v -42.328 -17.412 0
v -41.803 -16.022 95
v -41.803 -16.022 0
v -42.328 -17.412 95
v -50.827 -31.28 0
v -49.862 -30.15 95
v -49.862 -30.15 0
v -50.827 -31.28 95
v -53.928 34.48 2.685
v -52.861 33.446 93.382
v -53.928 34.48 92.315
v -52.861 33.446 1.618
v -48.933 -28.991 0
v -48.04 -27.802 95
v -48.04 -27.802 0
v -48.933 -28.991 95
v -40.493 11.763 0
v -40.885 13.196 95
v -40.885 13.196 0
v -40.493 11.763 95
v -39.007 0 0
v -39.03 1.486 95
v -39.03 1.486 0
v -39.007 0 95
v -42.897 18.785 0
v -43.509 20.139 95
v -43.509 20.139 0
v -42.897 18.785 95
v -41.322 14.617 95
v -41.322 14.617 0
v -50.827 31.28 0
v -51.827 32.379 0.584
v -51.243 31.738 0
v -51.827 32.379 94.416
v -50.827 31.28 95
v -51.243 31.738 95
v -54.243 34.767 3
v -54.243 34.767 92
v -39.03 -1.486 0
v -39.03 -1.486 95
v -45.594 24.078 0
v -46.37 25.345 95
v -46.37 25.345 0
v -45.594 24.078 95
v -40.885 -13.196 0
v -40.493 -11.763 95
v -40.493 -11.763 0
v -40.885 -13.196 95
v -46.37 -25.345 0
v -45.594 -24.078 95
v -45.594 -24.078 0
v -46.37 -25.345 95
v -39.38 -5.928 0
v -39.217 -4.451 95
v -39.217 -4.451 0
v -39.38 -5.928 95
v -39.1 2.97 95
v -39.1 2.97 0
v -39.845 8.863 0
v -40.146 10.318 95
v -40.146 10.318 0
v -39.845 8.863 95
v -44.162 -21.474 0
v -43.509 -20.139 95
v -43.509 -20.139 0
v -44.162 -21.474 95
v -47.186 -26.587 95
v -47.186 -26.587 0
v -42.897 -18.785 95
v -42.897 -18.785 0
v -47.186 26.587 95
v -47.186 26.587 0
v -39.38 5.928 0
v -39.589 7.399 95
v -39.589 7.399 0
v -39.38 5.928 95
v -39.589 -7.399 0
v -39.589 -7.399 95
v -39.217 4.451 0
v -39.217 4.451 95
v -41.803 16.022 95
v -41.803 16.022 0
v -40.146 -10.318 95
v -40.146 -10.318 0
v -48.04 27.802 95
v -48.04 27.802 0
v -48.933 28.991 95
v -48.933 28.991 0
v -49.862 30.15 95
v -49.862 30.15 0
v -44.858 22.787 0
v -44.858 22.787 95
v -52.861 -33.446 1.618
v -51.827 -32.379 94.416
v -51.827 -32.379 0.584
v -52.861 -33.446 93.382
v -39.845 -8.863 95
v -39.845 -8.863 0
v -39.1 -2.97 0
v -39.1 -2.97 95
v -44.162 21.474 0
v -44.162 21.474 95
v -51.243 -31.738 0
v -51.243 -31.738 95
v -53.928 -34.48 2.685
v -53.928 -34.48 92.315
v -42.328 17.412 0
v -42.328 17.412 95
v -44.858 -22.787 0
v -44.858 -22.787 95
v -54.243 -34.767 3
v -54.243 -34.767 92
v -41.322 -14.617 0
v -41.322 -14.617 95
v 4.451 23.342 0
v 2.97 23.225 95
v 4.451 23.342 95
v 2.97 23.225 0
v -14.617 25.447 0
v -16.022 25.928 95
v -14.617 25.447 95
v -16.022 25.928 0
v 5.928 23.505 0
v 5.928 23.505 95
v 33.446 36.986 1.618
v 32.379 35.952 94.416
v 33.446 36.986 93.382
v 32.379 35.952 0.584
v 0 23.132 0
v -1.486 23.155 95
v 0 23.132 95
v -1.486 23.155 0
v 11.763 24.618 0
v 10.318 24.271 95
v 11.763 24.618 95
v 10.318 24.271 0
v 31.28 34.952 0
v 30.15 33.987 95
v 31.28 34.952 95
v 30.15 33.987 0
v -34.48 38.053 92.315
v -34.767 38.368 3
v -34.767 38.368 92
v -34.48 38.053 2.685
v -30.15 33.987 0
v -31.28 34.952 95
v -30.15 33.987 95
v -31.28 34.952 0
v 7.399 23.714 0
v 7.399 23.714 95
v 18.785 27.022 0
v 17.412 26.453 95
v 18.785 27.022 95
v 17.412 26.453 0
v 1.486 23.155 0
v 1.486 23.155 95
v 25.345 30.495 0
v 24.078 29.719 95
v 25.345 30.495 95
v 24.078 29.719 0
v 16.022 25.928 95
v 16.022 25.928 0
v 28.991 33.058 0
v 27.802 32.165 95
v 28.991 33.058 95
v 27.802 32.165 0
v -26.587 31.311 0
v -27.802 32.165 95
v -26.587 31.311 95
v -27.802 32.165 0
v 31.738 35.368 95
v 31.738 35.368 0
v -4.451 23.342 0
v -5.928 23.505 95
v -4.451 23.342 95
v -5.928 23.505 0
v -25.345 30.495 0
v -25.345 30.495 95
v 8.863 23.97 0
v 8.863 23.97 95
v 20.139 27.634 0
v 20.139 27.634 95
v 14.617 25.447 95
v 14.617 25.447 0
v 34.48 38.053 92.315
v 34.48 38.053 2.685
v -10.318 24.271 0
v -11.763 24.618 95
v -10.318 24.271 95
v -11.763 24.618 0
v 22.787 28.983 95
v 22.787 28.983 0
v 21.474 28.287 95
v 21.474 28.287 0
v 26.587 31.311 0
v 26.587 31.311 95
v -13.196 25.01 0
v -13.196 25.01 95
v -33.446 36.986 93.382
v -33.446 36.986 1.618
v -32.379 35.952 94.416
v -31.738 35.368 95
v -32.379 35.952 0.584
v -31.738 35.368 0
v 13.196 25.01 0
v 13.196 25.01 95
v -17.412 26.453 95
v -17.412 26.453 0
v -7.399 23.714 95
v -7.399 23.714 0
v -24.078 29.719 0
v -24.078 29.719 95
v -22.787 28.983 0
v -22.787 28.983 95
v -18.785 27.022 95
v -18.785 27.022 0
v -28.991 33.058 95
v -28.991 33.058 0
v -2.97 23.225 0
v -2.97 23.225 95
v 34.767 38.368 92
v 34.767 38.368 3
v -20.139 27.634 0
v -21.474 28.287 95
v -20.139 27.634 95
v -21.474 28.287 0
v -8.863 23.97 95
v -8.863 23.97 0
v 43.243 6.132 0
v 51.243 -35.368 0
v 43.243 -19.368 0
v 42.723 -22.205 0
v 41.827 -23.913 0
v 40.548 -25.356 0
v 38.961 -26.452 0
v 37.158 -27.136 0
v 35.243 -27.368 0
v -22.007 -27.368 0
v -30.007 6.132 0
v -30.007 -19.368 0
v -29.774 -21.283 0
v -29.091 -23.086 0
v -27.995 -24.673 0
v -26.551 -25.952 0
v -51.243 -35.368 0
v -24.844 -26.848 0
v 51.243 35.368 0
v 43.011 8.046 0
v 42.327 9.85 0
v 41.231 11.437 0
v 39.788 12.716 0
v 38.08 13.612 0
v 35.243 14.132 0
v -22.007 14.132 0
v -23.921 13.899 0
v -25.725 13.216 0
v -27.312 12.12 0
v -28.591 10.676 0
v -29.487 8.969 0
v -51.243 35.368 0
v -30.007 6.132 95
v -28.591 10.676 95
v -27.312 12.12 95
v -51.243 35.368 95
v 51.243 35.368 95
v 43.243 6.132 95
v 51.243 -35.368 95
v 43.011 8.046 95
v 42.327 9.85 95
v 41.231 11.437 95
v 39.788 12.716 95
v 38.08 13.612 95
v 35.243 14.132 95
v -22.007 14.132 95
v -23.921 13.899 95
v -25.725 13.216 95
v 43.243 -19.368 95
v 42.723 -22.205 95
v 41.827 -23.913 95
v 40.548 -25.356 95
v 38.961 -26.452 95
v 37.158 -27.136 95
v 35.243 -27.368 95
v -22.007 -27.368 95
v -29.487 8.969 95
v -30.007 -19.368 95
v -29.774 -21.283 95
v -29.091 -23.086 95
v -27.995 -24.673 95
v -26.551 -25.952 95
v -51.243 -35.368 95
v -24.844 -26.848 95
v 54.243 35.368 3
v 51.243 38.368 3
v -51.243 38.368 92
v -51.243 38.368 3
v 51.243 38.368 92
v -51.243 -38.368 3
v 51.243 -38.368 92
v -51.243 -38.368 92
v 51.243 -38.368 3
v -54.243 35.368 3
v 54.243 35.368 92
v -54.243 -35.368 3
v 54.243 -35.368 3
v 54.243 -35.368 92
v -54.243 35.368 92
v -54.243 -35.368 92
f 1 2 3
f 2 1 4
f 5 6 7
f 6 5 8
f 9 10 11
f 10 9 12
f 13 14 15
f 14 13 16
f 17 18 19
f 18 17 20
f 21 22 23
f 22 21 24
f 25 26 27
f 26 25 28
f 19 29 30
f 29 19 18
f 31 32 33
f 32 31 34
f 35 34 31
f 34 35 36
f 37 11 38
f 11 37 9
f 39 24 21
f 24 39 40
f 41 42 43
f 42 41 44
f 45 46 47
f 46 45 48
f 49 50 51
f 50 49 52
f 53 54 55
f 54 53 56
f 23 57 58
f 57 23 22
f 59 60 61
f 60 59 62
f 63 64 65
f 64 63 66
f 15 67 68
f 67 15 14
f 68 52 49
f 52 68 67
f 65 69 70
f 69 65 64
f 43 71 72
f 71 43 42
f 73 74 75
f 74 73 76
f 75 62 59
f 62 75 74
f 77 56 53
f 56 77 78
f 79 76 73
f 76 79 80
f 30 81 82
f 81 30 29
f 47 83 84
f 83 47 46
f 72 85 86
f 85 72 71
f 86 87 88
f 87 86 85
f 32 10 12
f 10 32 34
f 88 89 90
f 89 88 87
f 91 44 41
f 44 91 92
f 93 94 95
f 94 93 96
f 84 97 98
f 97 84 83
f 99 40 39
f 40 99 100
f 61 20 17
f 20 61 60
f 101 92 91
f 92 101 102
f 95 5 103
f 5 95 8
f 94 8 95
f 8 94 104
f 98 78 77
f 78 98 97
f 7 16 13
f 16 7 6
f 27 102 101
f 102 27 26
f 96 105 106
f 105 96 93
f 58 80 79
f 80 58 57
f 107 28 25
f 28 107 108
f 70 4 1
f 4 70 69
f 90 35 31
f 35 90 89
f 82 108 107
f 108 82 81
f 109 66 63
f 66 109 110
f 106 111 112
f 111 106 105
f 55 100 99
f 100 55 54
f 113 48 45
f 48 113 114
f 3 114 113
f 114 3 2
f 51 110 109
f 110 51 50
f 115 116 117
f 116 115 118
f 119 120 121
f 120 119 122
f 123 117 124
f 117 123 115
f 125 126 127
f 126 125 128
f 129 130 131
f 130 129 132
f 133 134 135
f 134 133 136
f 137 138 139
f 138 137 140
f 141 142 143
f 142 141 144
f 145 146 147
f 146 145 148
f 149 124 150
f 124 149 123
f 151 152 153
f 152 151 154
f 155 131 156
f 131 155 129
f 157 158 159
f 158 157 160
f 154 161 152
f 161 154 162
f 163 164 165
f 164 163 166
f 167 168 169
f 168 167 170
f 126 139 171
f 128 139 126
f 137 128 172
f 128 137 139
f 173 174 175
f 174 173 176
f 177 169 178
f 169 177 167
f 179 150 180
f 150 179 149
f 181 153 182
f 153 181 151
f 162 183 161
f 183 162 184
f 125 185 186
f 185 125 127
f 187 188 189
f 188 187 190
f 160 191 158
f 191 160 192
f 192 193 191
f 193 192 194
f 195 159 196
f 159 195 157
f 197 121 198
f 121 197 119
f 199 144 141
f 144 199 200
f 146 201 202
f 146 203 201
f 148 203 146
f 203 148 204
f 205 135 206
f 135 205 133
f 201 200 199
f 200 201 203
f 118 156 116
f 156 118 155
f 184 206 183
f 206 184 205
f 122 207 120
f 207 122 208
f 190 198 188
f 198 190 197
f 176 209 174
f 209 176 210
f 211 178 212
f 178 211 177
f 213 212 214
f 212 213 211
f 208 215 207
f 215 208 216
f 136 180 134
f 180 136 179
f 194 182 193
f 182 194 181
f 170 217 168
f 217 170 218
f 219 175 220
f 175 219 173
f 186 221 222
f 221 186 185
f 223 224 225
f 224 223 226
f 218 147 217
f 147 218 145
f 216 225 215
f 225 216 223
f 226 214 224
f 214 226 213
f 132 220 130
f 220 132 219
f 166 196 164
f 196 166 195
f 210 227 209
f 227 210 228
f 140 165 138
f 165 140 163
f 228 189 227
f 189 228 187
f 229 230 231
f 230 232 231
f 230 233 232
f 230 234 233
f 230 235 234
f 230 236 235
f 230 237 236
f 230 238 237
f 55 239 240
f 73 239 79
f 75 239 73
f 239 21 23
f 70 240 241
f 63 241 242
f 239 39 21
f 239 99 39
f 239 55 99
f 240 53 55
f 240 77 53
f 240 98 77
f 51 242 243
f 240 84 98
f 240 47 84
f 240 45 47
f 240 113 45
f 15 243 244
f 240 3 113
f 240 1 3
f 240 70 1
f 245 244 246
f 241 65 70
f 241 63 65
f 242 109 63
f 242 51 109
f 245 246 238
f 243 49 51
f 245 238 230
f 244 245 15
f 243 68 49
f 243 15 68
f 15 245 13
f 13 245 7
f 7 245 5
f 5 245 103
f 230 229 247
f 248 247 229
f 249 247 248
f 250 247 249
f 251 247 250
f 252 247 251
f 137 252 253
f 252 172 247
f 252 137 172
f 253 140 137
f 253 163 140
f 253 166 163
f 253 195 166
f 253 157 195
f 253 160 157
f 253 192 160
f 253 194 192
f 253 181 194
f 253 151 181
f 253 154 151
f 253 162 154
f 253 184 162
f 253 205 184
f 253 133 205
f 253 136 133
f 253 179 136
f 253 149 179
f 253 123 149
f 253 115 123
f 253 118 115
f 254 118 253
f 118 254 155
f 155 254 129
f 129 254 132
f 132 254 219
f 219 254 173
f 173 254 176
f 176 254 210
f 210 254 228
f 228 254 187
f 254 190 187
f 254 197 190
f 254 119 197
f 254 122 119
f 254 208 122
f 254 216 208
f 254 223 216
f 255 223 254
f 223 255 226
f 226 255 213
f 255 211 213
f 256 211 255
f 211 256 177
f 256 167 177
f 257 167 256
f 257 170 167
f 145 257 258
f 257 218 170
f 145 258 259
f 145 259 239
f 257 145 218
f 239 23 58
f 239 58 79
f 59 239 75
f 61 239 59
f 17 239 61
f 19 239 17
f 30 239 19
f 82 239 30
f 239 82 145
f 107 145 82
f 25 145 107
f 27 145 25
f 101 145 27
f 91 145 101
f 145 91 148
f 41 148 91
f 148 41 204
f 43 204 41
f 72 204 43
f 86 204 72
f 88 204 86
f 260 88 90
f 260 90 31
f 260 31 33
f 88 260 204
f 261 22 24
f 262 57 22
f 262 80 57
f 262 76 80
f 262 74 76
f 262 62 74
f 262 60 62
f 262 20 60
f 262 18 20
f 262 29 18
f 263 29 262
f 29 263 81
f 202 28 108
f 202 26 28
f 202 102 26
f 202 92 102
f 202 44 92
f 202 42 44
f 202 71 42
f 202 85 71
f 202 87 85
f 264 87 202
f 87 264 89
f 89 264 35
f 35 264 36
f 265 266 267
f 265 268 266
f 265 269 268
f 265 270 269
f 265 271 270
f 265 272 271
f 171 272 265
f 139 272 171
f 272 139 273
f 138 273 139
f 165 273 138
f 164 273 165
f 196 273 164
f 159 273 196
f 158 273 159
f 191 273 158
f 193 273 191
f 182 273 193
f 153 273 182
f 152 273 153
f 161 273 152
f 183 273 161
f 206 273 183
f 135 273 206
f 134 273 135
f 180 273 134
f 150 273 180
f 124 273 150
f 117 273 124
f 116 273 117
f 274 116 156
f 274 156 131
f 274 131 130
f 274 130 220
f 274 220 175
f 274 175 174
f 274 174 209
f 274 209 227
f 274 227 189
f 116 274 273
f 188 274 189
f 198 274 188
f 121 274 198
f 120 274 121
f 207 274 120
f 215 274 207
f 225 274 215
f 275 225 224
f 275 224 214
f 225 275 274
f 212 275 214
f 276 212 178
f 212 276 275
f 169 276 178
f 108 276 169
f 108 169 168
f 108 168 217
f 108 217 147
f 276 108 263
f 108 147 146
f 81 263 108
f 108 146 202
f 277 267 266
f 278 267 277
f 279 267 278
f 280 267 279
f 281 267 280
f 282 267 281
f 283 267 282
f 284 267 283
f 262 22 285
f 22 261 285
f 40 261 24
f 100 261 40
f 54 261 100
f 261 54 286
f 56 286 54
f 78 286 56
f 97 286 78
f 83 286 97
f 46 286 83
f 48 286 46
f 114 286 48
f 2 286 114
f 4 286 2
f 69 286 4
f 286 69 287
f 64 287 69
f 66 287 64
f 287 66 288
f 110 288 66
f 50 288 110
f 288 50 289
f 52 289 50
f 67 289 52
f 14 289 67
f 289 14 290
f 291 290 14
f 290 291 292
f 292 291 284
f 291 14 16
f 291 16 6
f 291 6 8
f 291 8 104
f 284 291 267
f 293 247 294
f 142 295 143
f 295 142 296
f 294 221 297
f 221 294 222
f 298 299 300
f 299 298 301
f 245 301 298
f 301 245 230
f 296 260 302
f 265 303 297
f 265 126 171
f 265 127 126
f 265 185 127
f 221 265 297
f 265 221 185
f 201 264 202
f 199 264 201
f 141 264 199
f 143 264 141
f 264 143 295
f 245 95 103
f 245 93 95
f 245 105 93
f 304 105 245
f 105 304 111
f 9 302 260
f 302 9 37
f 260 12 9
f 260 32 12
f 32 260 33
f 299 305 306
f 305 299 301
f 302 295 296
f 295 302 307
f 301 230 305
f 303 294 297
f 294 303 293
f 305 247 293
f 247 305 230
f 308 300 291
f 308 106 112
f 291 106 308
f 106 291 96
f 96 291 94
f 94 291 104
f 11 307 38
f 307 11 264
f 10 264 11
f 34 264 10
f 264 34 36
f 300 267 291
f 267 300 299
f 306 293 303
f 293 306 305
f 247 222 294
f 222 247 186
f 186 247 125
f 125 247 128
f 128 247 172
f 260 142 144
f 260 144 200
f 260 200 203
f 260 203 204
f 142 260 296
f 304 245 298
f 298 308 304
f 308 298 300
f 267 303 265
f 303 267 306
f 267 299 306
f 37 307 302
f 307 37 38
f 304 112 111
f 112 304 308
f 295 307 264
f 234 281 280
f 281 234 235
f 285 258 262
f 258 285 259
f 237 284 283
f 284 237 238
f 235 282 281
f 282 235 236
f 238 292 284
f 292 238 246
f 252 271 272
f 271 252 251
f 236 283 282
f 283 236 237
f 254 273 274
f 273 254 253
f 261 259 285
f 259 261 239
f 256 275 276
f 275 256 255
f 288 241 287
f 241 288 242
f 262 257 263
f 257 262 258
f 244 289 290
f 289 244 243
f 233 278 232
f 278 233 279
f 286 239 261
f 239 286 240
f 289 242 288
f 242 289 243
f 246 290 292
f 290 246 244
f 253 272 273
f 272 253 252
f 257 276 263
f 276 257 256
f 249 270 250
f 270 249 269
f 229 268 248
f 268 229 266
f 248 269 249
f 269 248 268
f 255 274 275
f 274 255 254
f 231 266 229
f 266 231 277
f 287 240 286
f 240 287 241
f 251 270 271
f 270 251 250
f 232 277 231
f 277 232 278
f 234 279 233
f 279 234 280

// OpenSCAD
// file: params.scad
// Written by concepts.py. Do not edit: change the parameter set there.
IN = 25.4;
LOW = 63.5; HIGH = 95.25; TALL = 127.0; FLAT = 31.75;
CW = 64.0; CR = 45.3; PAD_T = 2.0; RR = 130.0; X_REST = 95.0;
NECK_W0 = 41.275; NECK_W1 = 55.88; NECK_D0 = 23.875999999999998; NECK_D1 = 25.145999999999997;
NECK_L12 = 431.79999999999995; NECK_DRAW = 235.0; HEAD_STUB = 45.0;
FRETS = [48.47, 94.22, 137.4, 178.16, 216.63, 252.94, 287.22, 319.57, 350.1, 378.92, 406.12, 431.8];
TILT_LOW = 2.187; TILT_HIGH = 4.377; TILT_TALL = 6.573;
F_LIFT = 20.0; TILT_F = 3.600;
YC = 80.0; C3_SLOPE = 2.629;
LONG = [["c1a", 152.39999999999998, 75.0, 95.20, 4.378], ["c1b", 203.2, 75.0, 120.60, 4.516], ["c1c", 203.2, 50.8, 120.60, 4.516]];
// main file
// Concept solids for the guitar neck rest options page.
// mm. X along the neck (nut toward -X, body toward +X), Y across the neck, Z up, bench at Z = 0.
// Every number comes from params.scad, which concepts.py writes from its one parameter set.
//
//   PART  a | b | c | d_base | d_cradle | e | f_base | f_head          round 1: six base shapes
//         c1 | c2 | c2_lid | c3                                       round 2: three rocker bodies
//         c1a | c1b | c1c                                             round 3: the open frame with a longer cradle (LONG)
//         c1r                                                         the kept body: c1 with its edges rounded over
//   MODE  part   the bare printable solid in its print orientation (for STL export)
//         scene  on the bench with its pad and the neck stand-in (for the pictures)
//   VIEW  shape  the bare rest with its pad
//         use    with the neck stand-in on it
//         extra  the other height, the parts apart, or the range
//         pad    round 2: the rocker close up, pad and tread in PADMAT (cork | felt | tpu)
//         end    c1r: one cradle end close up
include <params.scad>

PART = "a";
MODE = "part";
VIEW = "shape";
NECK = "bass";
PADMAT = "cork";

CD = CR - sqrt(CR * CR - CW * CW / 4);        // cradle depth at the pad surface
GR = CR + PAD_T;                              // groove radius cut into the body (pad sits in it)
GW = sqrt(GR * GR - (CR - CD) * (CR - CD));   // half width of the groove cut at the rim

C_BODY = "#4f83e6";
C_BODY2 = "#89aef2";
C_PAD = "#c9a26b";
C_MAT = "#44584f";
C_GRID = "#6f867b";
C_NECK = "#e6c992";
C_BOARD = "#4b3023";
C_FRET = "#d9d9d9";
C_NUT = "#f5f1e6";
C_FILL = "#8d949e";
C_SOFT = PADMAT == "felt" ? "#3f6b52" : PADMAT == "tpu" ? "#2a2e36" : C_PAD;

// ---------------------------------------------------------------- helpers
module cbox(s, c = 3) {   // centred box with all edges chamfered by c
  hull() {
    cube([s.x - 2 * c, s.y - 2 * c, s.z], center = true);
    cube([s.x - 2 * c, s.y, s.z - 2 * c], center = true);
    cube([s.x, s.y - 2 * c, s.z - 2 * c], center = true);
  }
}

// Groove for a cradle on a +Z face, running along X, pad surface lowest at Z = zb.
module groove(len, zb) {
  translate([0, 0, zb + CR]) rotate([0, 90, 0]) cylinder(r = GR, h = len + 2, center = true, $fn = 200);
}

// The stick-on pad that lines that groove.
module pad(len, zb) {
  intersection() {
    translate([0, 0, zb + CR]) rotate([0, 90, 0]) difference() {
      cylinder(r = GR - 0.06, h = len - 6, center = true, $fn = 200);   // just shy of the groove: coincident faces speckle in preview
      cylinder(r = CR, h = len, center = true, $fn = 200);
    }
    translate([-len / 2 + 1, -CW / 2 + 1, zb - PAD_T - 1]) cube([len - 2, CW - 2, CD + PAD_T + 1]);   // short of the body's end faces: coplanar faces speckle in preview
  }
}

// ---------------------------------------------------------------- neck stand-in
function neck_w(x) = NECK_W0 + (NECK_W1 - NECK_W0) * x / NECK_L12;
function neck_d(x) = NECK_D0 + (NECK_D1 - NECK_D0) * x / NECK_L12;

module neck_profile(w, d) {   // 2D, back lowest point at the origin
  fb = 6.35;
  translate([-w / 2, d - fb]) square([w, fb]);
  translate([0, d - fb]) scale([w / 2, d - fb]) difference() {
    circle(1, $fn = 96);
    translate([-2, 0]) square([4, 2]);
  }
}

module neck_slice(x) {
  translate([x, 0, 0]) rotate([90, 0, 90]) linear_extrude(0.1) neck_profile(neck_w(x), neck_d(x));
}

// Nut at x = 0, back of the neck along z = 0, drawn out to l with a cut-off headstock stub.
module neck(l = NECK_DRAW) {
  color(C_NECK, 0.92) {
    hull() { neck_slice(0); neck_slice(l); }
    hull() {   // headstock stub, cut off
      translate([-2, -neck_w(0) / 2, neck_d(0) - 4.5 - 14.5]) cube([2, neck_w(0), 14.5]);
      translate([-HEAD_STUB, -neck_w(0) / 2 - 12, neck_d(0) - 4.5 - 14.5]) cube([2, neck_w(0) + 24, 14.5]);
    }
  }
  color(C_BOARD) hull() {
    translate([0, -neck_w(0) / 2 + 0.3, neck_d(0) - 0.4]) cube([0.1, neck_w(0) - 0.6, 0.7]);
    translate([l, -neck_w(l) / 2 + 0.3, neck_d(l) - 0.4]) cube([0.1, neck_w(l) - 0.6, 0.7]);
  }
  color(C_NUT) translate([-3.2, -neck_w(0) / 2, neck_d(0) - 2]) cube([3.2, neck_w(0), 4.5]);
  for (x = FRETS) if (x < l - 2)
    color(C_FRET) translate([x - 1.2, -neck_w(x) / 2, neck_d(x)]) cube([2.4, neck_w(x), 1.3]);
}

// A neck on a fixed, level cradle: it slopes down toward the body, so it bears on the body-side end of the pad.
module neck_on_fixed(len, zb, tilt) {
  translate([len / 2 - 3, 0, zb]) rotate([0, tilt, 0]) translate([-(X_REST + len / 2 - 3), 0, 0]) neck();
}

// A neck lying along a cradle that has turned to meet it.
module neck_aligned(zb, xr = X_REST, l = NECK_DRAW) {
  translate([-xr, 0, zb]) neck(l);
}

module bench(l = 300, x0 = 0, w = 250) {   // cutting mat with a 1 in grid, for scale
  color(C_MAT) translate([x0, 0, -2.01]) cube([l, w, 4], center = true);
  color(C_GRID) {
    for (i = [ceil((x0 - l / 2) / IN) : floor((x0 + l / 2) / IN)]) translate([i * IN - 0.35, -w / 2, 0]) cube([0.7, w, 0.12]);
    for (j = [ceil(-w / 2 / IN) : floor(w / 2 / IN)]) translate([x0 - l / 2, j * IN - 0.35, 0]) cube([l, 0.7, 0.12]);
  }
}

// ---------------------------------------------------------------- A: two-height frame block
XA = 95;
YA = LOW + CD;
ZA = HIGH + CD;

module a_grooved(pads = false) {
  if (pads) {
    pad(XA, HIGH);
    translate([0, 0, ZA / 2]) rotate([-90, 0, 0]) pad(XA, -YA / 2 + LOW);
  } else {
    groove(XA, HIGH);
    translate([0, 0, ZA / 2]) rotate([-90, 0, 0]) groove(XA, -YA / 2 + LOW);
  }
}

module a_body() {
  wy0 = -YA / 2 + 11;
  wy1 = YA / 2 - CD - PAD_T - 9;
  wz0 = 11;
  wz1 = HIGH - PAD_T - 9;
  difference() {
    translate([0, 0, ZA / 2]) cbox([XA, YA, ZA]);
    a_grooved();
    translate([0, (wy0 + wy1) / 2, (wz0 + wz1) / 2]) rotate([0, 90, 0])
      linear_extrude(XA + 2, center = true) offset(r = 8) square([wz1 - wz0 - 16, wy1 - wy0 - 16], center = true);
  }
}

module a_low() {   // lying on its -Y face: the +Y cradle is up, at LOW
  translate([0, ZA / 2, YA / 2]) rotate([90, 0, 0]) children();
}

// ---------------------------------------------------------------- B: three-height block
BA = LOW + CD;     // local x
BB = HIGH + CD;    // local y
BC = TALL + CD;    // local z
M_B_ON_B = [[0, 1, 0, 0], [0, 0, 1, 0], [1, 0, 0, 0]];     // module X -> local z, module Z -> local +y
M_B_ON_A = [[0, 0, 1, 0], [0, -1, 0, 0], [1, 0, 0, 0]];    // module X -> local z, module Z -> local +x

module b_local(pads = false) {
  if (pads) {
    pad(BA, -BC / 2 + TALL);
    multmatrix(M_B_ON_B) pad(BC, -BB / 2 + HIGH);
    multmatrix(M_B_ON_A) pad(BC, -BA / 2 + LOW);
  } else {
    difference() {
      cbox([BA, BB, BC], 4);
      groove(BA, -BC / 2 + TALL);
      multmatrix(M_B_ON_B) groove(BC, -BB / 2 + HIGH);
      multmatrix(M_B_ON_A) groove(BC, -BA / 2 + LOW);
    }
  }
}

module b_up_b() { multmatrix([[0, 0, 1, 0], [1, 0, 0, 0], [0, 1, 0, BB / 2]]) children(); }    // HIGH cradle up
module b_up_a() { multmatrix([[0, 0, 1, 0], [0, -1, 0, 0], [1, 0, 0, BA / 2]]) children(); }   // LOW cradle up
module b_up_c() { translate([0, 0, BC / 2]) children(); }                                      // TALL cradle up

// ---------------------------------------------------------------- C: rocker
XC_TOP = 110;
ZC = HIGH + CD;
C_HALF = 75;                                   // half chord of the rocking arc
C_SAG = RR - sqrt(RR * RR - C_HALF * C_HALF);

// Side view: the rocking arc under a tapered block. With deck > 0 the cradle beam keeps square ends that deep
// and the sides run to its lower corners (round 3, where the cradle is longer than the rocker).
module c_outline(n = 40, top = XC_TOP, half = C_HALF, deck = 0) {
  tm = asin(half / RR);
  offset(r = 5) offset(delta = -5) polygon(concat(
    [for (i = [0:n]) let(t = -tm + 2 * tm * i / n) [RR * sin(t), RR * (1 - cos(t))]],
    deck > 0 ? [[top / 2, ZC - deck], [top / 2, ZC], [-top / 2, ZC], [-top / 2, ZC - deck]]
             : [[top / 2, ZC], [-top / 2, ZC]]));
}

module c_profile() {
  difference() {
    c_outline();
    hull() for (x = [-26, 26]) for (z = [C_SAG + 22, HIGH - PAD_T - 22]) translate([x, z]) circle(r = 10, $fn = 48);
  }
}

module c_body() {
  difference() {
    rotate([90, 0, 0]) linear_extrude(YC, center = true, convexity = 4) c_profile();
    groove(XC_TOP + 60, HIGH);
  }
}

module c_rolled(t) { translate([0, 0, RR]) rotate([0, t, 0]) translate([0, 0, -RR]) children(); }

// ---------------------------------------------------------------- C, round 2: three rocker bodies
// c1  open frame.
// c2  closed, with a ballast pocket under a lid on the -Y face and a hang slot above it.
// c3  closed, with a second, fixed cradle on the -Y face: lay the rocker on its +Y face and the neck
//     sits at C3_LOW on a cradle that already slopes C3_SLOPE toward the body.
// All three carry two recessed tread strips on the rocking curve.
C_FR = 12;                         // frame thickness of the open body
TR_W = 14;                         // tread strip width
TR_IN = 3;                         // lip left outside each strip
TR_D = 1.2;                        // recess depth: a 1.6 mm strip stands 0.4 proud
C2_PX = 22;                        // ballast pocket: half spacing of the obround's centres
C2_PR = 17;                        //   radius
C2_PZ = 30;                        //   height of its centre line
C2_PD = 64;                        //   depth from the -Y face
C2_LID = 3;                        // lid plate thickness, let into a rebate C2_LIP wide
C2_LIP = 2.5;
C2_SKIRT = 6;                      // lid skirt, inside the pocket
C2_SLOT_Z = 67;                    // hang slot above the pocket
C2_SLOT_R = 9;
C2_VOL = (4 * C2_PX * C2_PR + PI * C2_PR * C2_PR) * (C2_PD - C2_LID - C2_SKIRT) / 1000;   // cm3 behind the skirt
C3_ZS = 62;                        // side cradle centre line, measured up the upright rocker
C3_Y0 = YC / 2 - CD;               // its pad surface, measured from the rocker's centre plane
C3_LOW = YC / 2 + C3_Y0;           // neck height on the fixed cradle
C3_LEN = 116;                      // pad length on the fixed cradle

module tread(out = 0.4, half = C_HALF) {   // the two strips on the rocking curve, reaching `out` past the curve
  tm = asin(half / RR) - 4;
  n = 80;
  for (s = [-1, 1]) translate([0, s * (YC / 2 - TR_IN - TR_W / 2), RR]) rotate([90, 0, 0])
    linear_extrude(TR_W, center = true, convexity = 4) polygon(concat(
      [for (i = [0:n]) let(t = -tm + 2 * tm * i / n) [(RR + out) * sin(t), -(RR + out) * cos(t)]],
      [for (i = [n:-1:0]) let(t = -tm + 2 * tm * i / n) [(RR - TR_D) * sin(t), -(RR - TR_D) * cos(t)]]));
}

module c1_body(top = XC_TOP, half = C_HALF, deck = 0) {
  difference() {
    rotate([90, 0, 0]) linear_extrude(YC, center = true, convexity = 6) difference() {
      c_outline(160, top, half, deck);
      offset(r = 9) offset(delta = -9) intersection() {
        offset(delta = -C_FR) c_outline(160, top, half, deck);
        translate([-200, 0]) square([400, HIGH - PAD_T - C_FR]);
      }
    }
    groove(top + 60, HIGH);
    tread(1, half);
  }
}

// Obround prism opening on the -Y face: starts y0 in from that face and runs d deep.
module c2_pocket(r, y0, d) {
  translate([0, -YC / 2 + y0 + d, 0]) rotate([90, 0, 0]) linear_extrude(d, convexity = 4)
    hull() for (x = [-C2_PX, C2_PX]) translate([x, C2_PZ]) circle(r = r, $fn = 72);
}

module c2_body() {
  difference() {
    rotate([90, 0, 0]) linear_extrude(YC, center = true, convexity = 6) difference() {
      c_outline(160);
      hull() for (x = [-C2_PX, C2_PX]) translate([x, C2_SLOT_Z]) circle(r = C2_SLOT_R, $fn = 48);
    }
    groove(XC_TOP + 60, HIGH);
    tread(1);
    c2_pocket(C2_PR, -1, C2_PD + 1);
    c2_pocket(C2_PR + C2_LIP, -1, C2_LID + 1);
  }
}

module c2_lid(clear = 0.15) {      // in place on the body: plate in the rebate, skirt in the pocket
  c2_pocket(C2_PR + C2_LIP - clear, 0, C2_LID);
  difference() {
    c2_pocket(C2_PR - clear, C2_LID - 0.01, C2_SKIRT);
    c2_pocket(C2_PR - clear - 2, C2_LID - 1, C2_SKIRT + 2);
  }
}

module c2_fill() { c2_pocket(C2_PR - 0.6, C2_LID + C2_SKIRT + 0.5, C2_PD - C2_LID - C2_SKIRT - 1); }

// Puts a +Z-face groove or pad on the -Y face at C3_ZS, sloped for the laid-down rocker (lower toward +X).
module c3_place() {
  translate([0, -C3_Y0, C3_ZS]) rotate([0, 0, C3_SLOPE]) translate([0, C3_Y0, 0]) rotate([90, 0, 0]) children();
}

module c3_body() {
  difference() {
    rotate([90, 0, 0]) linear_extrude(YC, center = true, convexity = 6) c_outline(160);
    groove(XC_TOP + 60, HIGH);
    tread(1);
    c3_place() groove(190, C3_Y0);
  }
}

module c3_lying() { translate([0, -C3_ZS, YC / 2]) rotate([-90, 0, 0]) children(); }   // on its +Y face, fixed cradle up

module c_any(n) {                  // rocker body n with its pad and tread
  color(C_BODY) { if (n == 1) c1_body(); if (n == 2) c2_body(); if (n == 3) c3_body(); }
  color(C_SOFT) { pad(XC_TOP, HIGH); tread(0.4); if (n == 3) c3_place() pad(C3_LEN, C3_Y0); }
}

// ---------------------------------------------------------------- C1, round 3: a longer cradle
// LONG (params.scad) lists the variants: [name, cradle length, half chord of the rocking arc, rest centre from the nut,
// roll under the bass]. Same curve radius, cradle section, frame and tread as c1; only the two lengths change.
function lv(p) = [for (v = LONG) if (v[0] == p) v][0];
LV = lv(PART);
C_DECK = CD + PAD_T + C_FR;        // the cradle beam: groove, pad allowance and the frame under them
NECK_DRAW_LONG = 330;

module long_body(v) { c1_body(v[1], v[2], C_DECK); }

module long_any(v) {               // long-cradle body with its pad and tread
  color(C_BODY) long_body(v);
  color(C_SOFT) { pad(v[1], HIGH); tread(0.4, v[2]); }
}

// ---------------------------------------------------------------- C1 with its edges rounded over (Brian, 2026-11-23)
// "the front and back edges closest to the neck should be rounded over": the two cradle ends (confirmed by a question).
// "all edges should have a slight roundover": every other outside edge.
// Same body as c1, built the way it prints (on its side, one slice per layer): each slice across the neck is the side
// outline with its top at the height the cradle has there and its two top corners rounded R_END. The cradle's rims are
// rounded R_EDGE in that height curve, and the outline shrinks through a quarter circle of R_EDGE at the two faces.
// The window flares through the same quarter circle. The tread recesses stay square: the strips seat in them.
R_END = 6.35;                      // 1/4 in: the two cradle ends
R_EDGE = 1.5875;                   // 1/16 in: every other outside edge
C_LEAN = atan((C_HALF - XC_TOP / 2) / (ZC - C_SAG));              // the end faces lean this far from upright
C_ZA = HIGH + CR;                                                 // axis of the groove
RIM_Y = sqrt(pow(GR + R_EDGE, 2) - pow(C_ZA - ZC + R_EDGE, 2));   // centre of the rim roundover, off the centre plane
RIM_YG = RIM_Y * GR / (GR + R_EDGE);                              // where that roundover leaves the groove
C1R_FLAT = 2 * (C_HALF - (HIGH - PAD_T - C_SAG) * tan(C_LEAN) - R_END * tan((90 - C_LEAN) / 2));   // level floor between the end roundovers
C1R_STEPS = 8;                     // facets on a 1/16 in roundover

function c1r_top(y) = y <= RIM_YG ? C_ZA - sqrt(GR * GR - y * y)                             // top of the body at y: groove,
                    : y < RIM_Y ? ZC - R_EDGE + sqrt(R_EDGE * R_EDGE - pow(y - RIM_Y, 2))    // rim roundover,
                    : ZC;                                                                    // shoulder
function c1r_inset(y) = y <= YC / 2 - R_EDGE ? 0 : R_EDGE - sqrt(R_EDGE * R_EDGE - pow(y - (YC / 2 - R_EDGE), 2));
c1r_ys = concat([for (i = [0:72]) RIM_YG * i / 72],
                [for (i = [1:C1R_STEPS]) RIM_YG + (RIM_Y - RIM_YG) * i / C1R_STEPS],
                [for (i = [0:C1R_STEPS]) YC / 2 - R_EDGE + R_EDGE * sin(90 * i / C1R_STEPS)]);

// Centre of the +X top corner's arc for a top at height h, and the upper part of the side outline from z0 up.
function c1r_corner(h) = let(s = (h - R_END - C_SAG + R_END * sin(C_LEAN)) / cos(C_LEAN))
  [C_HALF - s * sin(C_LEAN) - R_END * cos(C_LEAN), h - R_END];
function c1r_top_pts(h, z0 = 50, n = 20) = let(c = c1r_corner(h), x0 = C_HALF - (z0 - C_SAG) * tan(C_LEAN))
  concat([[x0, z0]],
         [for (i = [0:n]) let(a = C_LEAN + (90 - C_LEAN) * i / n) [c[0] + R_END * cos(a), c[1] + R_END * sin(a)]],
         [for (i = [n:-1:0]) let(a = C_LEAN + (90 - C_LEAN) * i / n) [-c[0] - R_END * cos(a), c[1] + R_END * sin(a)]],
         [[-x0, z0]]);

module c1r_side(h) {               // side outline with its top at h
  intersection() { c_outline(160, $fn = 72); translate([-200, -10]) square([400, 70]); }
  polygon(c1r_top_pts(h));
}

module c1r_slab(y) {               // 0.02 thick, lying just inside y, so the last one ends exactly on the face
  translate([0, y, 0]) rotate([90, 0, 0]) linear_extrude(0.02)
    offset(delta = -c1r_inset(y)) c1r_side(c1r_top(y));
}

module c1r_half() { for (i = [0 : len(c1r_ys) - 2]) hull() { c1r_slab(c1r_ys[i]); c1r_slab(c1r_ys[i + 1]); } }

module c1_window() {               // the opening of the open frame, as c1_body() cuts it
  offset(r = 9) offset(delta = -9) intersection() {
    offset(delta = -C_FR) c_outline(160);
    translate([-200, 0]) square([400, HIGH - PAD_T - C_FR]);
  }
}

module c1r_wslab(s, i, out = 0) {
  a = 90 * i / C1R_STEPS;
  translate([0, s * (YC / 2 - R_EDGE + R_EDGE * sin(a) + out), 0]) rotate([90, 0, 0]) linear_extrude(0.02, center = true)
    offset(delta = R_EDGE * (1 - cos(a))) c1_window($fn = 72);
}

module c1r_window_cut() {
  rotate([90, 0, 0]) linear_extrude(YC - 2 * R_EDGE + 0.02, center = true, convexity = 4) c1_window($fn = 72);
  for (s = [-1, 1]) {
    for (i = [0 : C1R_STEPS - 1]) hull() { c1r_wslab(s, i); c1r_wslab(s, i + 1); }
    hull() { c1r_wslab(s, C1R_STEPS); c1r_wslab(s, C1R_STEPS, 1); }
  }
}

module c1r_body() {
  difference() {
    union() { c1r_half(); mirror([0, 1, 0]) c1r_half(); }
    c1r_window_cut();
    tread(1);
  }
}

module c1r_any() {                 // the kept body with its pad and tread
  color(C_BODY) render(convexity = 6) c1r_body();
  color(C_SOFT) { pad(XC_TOP, HIGH); tread(0.4); }
}

// ---------------------------------------------------------------- D: hanging cradle on a yoke
XD = 124;
YD = 116;
D_PLATE = 8;
D_UP_T = 12;
D_GAP = 88;                 // between the uprights
D_CR_L = 100;
D_CR_W = D_GAP - 4;
D_ZP = HIGH + 4;            // pivot axis: just above the line the neck bears on, so the cradle hangs
D_PIN = 12;
D_ZU = D_ZP + 9;

module d_base() {
  translate([0, 0, D_PLATE / 2]) cbox([XD, YD, D_PLATE], 2);
  for (s = [-1, 1]) translate([0, s * (D_GAP / 2 + D_UP_T / 2), 0]) difference() {
    rotate([90, 0, 0]) linear_extrude(D_UP_T, center = true)
      polygon([[-34, D_PLATE - 1], [34, D_PLATE - 1], [15, D_ZU], [-15, D_ZU]]);
    translate([0, 0, D_ZP]) rotate([90, 0, 0]) cylinder(d = D_PIN + 0.8, h = D_UP_T + 2, center = true, $fn = 64);
    translate([-(D_PIN + 0.8) / 2, -D_UP_T / 2 - 1, D_ZP]) cube([D_PIN + 0.8, D_UP_T + 2, 20]);
  }
}

module d_cradle() {
  h = CD + PAD_T + 9;
  difference() {
    translate([0, 0, HIGH + CD - h / 2]) cbox([D_CR_L, D_CR_W, h], 2.5);
    groove(D_CR_L, HIGH);
  }
  for (s = [-1, 1]) translate([0, s * (D_CR_W / 2 - 3), D_ZP]) rotate([-s * 90, 0, 0])
    cylinder(d = D_PIN, h = D_UP_T + 5, $fn = 64);
}

module d_swung(t) { translate([0, 0, D_ZP]) rotate([0, t, 0]) translate([0, 0, -D_ZP]) children(); }

// ---------------------------------------------------------------- E: long low trough
XE = 9 * IN;
ZE = FLAT + CD;
E_CORE = 2 * GW + 8;
E_FOOT = E_CORE + 40;

module e_body() {
  difference() {
    rotate([90, 0, 90]) linear_extrude(XE, center = true)
      polygon([[-E_FOOT / 2, 0], [E_FOOT / 2, 0], [E_FOOT / 2, 7], [E_CORE / 2, 19], [E_CORE / 2, ZE],
               [-E_CORE / 2, ZE], [-E_CORE / 2, 19], [-E_FOOT / 2, 7]]);
    groove(XE, FLAT);
  }
}

// ---------------------------------------------------------------- F: screw-adjustable pedestal
F_DISC_D = 130;
F_DISC_T = 10;
F_RM = 20.75;      // mean thread radius
F_E = 1.25;        // thread amplitude: 44.5 degree flank at this pitch, prints without support
F_P = 8;           // pitch
F_LS = 46;         // sleeve length = post length
F_SLEEVE_D = 66;
F_FLOOR = 6;
XF = 100;
YF = 2 * GW + 8;
F_ZB0 = F_LS + F_FLOOR + PAD_T;     // pad surface above the sleeve's bottom end
F_MIN = F_DISC_T + F_ZB0;
F_ENGAGE = 16;
F_MAX = F_MIN + F_LS - F_ENGAGE;

module f_thread(h, clear = 0) {
  linear_extrude(height = h, twist = -360 * h / F_P, slices = ceil(h * 3), convexity = 4)
    translate([F_E, 0]) circle(r = F_RM + clear, $fn = 72);
}

module f_base() {
  cylinder(d = F_DISC_D, h = F_DISC_T - 3, $fn = 128);
  translate([0, 0, F_DISC_T - 3]) cylinder(d1 = F_DISC_D, d2 = F_DISC_D - 6, h = 3, $fn = 128);
  translate([0, 0, F_DISC_T - 0.01]) f_thread(F_LS);
}

module f_head() {   // z = 0 at the sleeve's bottom end
  top = F_ZB0 + CD;
  difference() {
    union() {
      cylinder(d = F_SLEEVE_D, h = F_LS, $fn = 128);
      hull() {
        translate([0, 0, F_LS - 32]) cylinder(d = F_SLEEVE_D, h = 0.1, $fn = 128);
        translate([0, 0, F_LS + (top - F_LS) / 2]) cbox([XF, YF, top - F_LS], 2.5);
      }
    }
    translate([0, 0, -1]) f_thread(F_LS + 1, 0.45);
    groove(XF, F_ZB0);
  }
}

// ---------------------------------------------------------------- output
module body() { color(C_BODY) children(); }

if (MODE == "part") {
  if (PART == "a") translate([0, 0, XA / 2]) rotate([0, -90, 0]) translate([0, 0, -ZA / 2]) a_body();   // standing on end
  if (PART == "b") b_up_a() b_local();
  if (PART == "c") translate([0, 0, YC / 2]) rotate([90, 0, 0]) c_body();                               // on its side
  if (PART == "c1") translate([0, 0, YC / 2]) rotate([90, 0, 0]) c1_body();                             // on its side
  if (PART == "c2") translate([0, 0, YC / 2]) rotate([-90, 0, 0]) c2_body();                            // on its side, pocket up
  if (PART == "c2_lid") translate([0, 0, YC / 2]) rotate([90, 0, 0]) c2_lid();                          // plate down, skirt up
  if (PART == "c3") c3_lying() c3_body();                                                               // on its side, fixed cradle up
  if (!is_undef(LV)) translate([0, 0, YC / 2]) rotate([90, 0, 0]) long_body(LV);                        // on its side
  if (PART == "c1r") translate([0, 0, YC / 2]) rotate([90, 0, 0]) c1r_body();                           // on its side
  if (PART == "d_base") d_base();
  if (PART == "d_cradle") translate([0, 0, -(HIGH - PAD_T - 9)]) d_cradle();
  if (PART == "e") e_body();
  if (PART == "f_base") f_base();
  if (PART == "f_head") f_head();
} else {
  if (!is_undef(LV)) bench(VIEW == "use" ? 470 : 300, VIEW == "use" ? 25 : 0);
  else if (VIEW == "use" || (VIEW == "extra" && PART == "c3")) bench(430, 50);
  else if (VIEW == "extra" && PART == "b") bench(480, 0);
  else if (VIEW == "extra" && (PART == "f" || PART == "a")) bench(VIEW == "extra" && PART == "a" ? 430 : 360, PART == "a" ? 50 : 0);
  else bench();

  if (PART == "a") {
    if (VIEW == "extra") {   // lying on its side: the low cradle is up
      a_low() { body() a_body(); color(C_PAD) a_grooved(pads = true); }
      neck_on_fixed(XA, LOW, TILT_LOW);
    } else {
      body() a_body();
      color(C_PAD) a_grooved(pads = true);
      if (VIEW == "use") neck_on_fixed(XA, HIGH, TILT_HIGH);
    }
  }
  if (PART == "b") {
    if (VIEW == "extra") {   // the three ways up, side by side
      translate([-160, 0, 0]) b_up_a() { body() b_local(); color(C_PAD) b_local(pads = true); }
      translate([0, 0, 0]) b_up_b() { body() b_local(); color(C_PAD) b_local(pads = true); }
      translate([150, 0, 0]) b_up_c() { body() b_local(); color(C_PAD) b_local(pads = true); }
    } else {
      b_up_b() { body() b_local(); color(C_PAD) b_local(pads = true); }
      if (VIEW == "use") neck_on_fixed(BC, HIGH, TILT_HIGH);
    }
  }
  if (PART == "c") c_rolled(VIEW == "use" ? TILT_HIGH : 0) {
    body() c_body();
    color(C_PAD) pad(XC_TOP, HIGH);
    if (VIEW == "use") neck_aligned(HIGH);
  }
  if (PART == "c1" || PART == "c2" || PART == "c3") {
    n = PART == "c1" ? 1 : PART == "c2" ? 2 : 3;
    if (VIEW == "use") c_rolled(TILT_HIGH) { c_any(n); if (n == 2) color(C_BODY2) c2_lid(); neck_aligned(HIGH); }
    else if (VIEW == "extra" && n == 1) translate([0, 0, ZC]) rotate([180, 0, 0]) c_any(1);   // upside down: the tread
    else if (VIEW == "extra" && n == 2) {   // lid off, ballast in the pocket
      c_any(2);
      color(C_FILL) c2_fill();
      translate([0, -70, 0]) color(C_BODY2) c2_lid();
    }
    else if (VIEW == "extra" && n == 3) {   // laid down: the fixed cradle is up
      c3_lying() c_any(3);
      translate([0, 0, C3_LOW]) rotate([0, C3_SLOPE, 0]) translate([-X_REST, 0, 0]) neck();
    }
    else { c_any(n); if (n == 2) color(C_BODY2) c2_lid(); }
  }
  if (!is_undef(LV)) {
    if (VIEW == "use") c_rolled(LV[4]) { long_any(LV); neck_aligned(HIGH, LV[3], NECK_DRAW_LONG); }
    else long_any(LV);
  }
  if (PART == "c1r") {
    if (VIEW == "use") c_rolled(TILT_HIGH) { c1r_any(); neck_aligned(HIGH); }
    else if (VIEW == "extra") translate([0, 0, ZC]) rotate([180, 0, 0]) c1r_any();   // upside down: the tread
    else c1r_any();
  }
  if (PART == "d") {
    body() d_base();
    translate([0, 0, VIEW == "extra" ? 45 : 0]) d_swung(VIEW == "use" ? TILT_HIGH : 0) {
      color(C_BODY2) d_cradle();
      color(C_PAD) pad(D_CR_L, HIGH);
      if (VIEW == "use") neck_aligned(HIGH);
    }
  }
  if (PART == "e") {
    body() e_body();
    color(C_PAD) pad(XE, FLAT);
    if (VIEW == "use") neck_on_fixed(XE, FLAT, 0);
  }
  if (PART == "f") {
    if (VIEW == "extra") {   // lowest and highest, side by side
      for (k = [0, 1]) translate([k == 0 ? -85 : 85, 0, 0]) {
        body() f_base();
        translate([0, 0, F_DISC_T + (k == 0 ? 0 : F_LS - F_ENGAGE)]) { color(C_BODY2) f_head(); color(C_PAD) pad(XF, F_ZB0); }
      }
    } else {
      body() f_base();
      translate([0, 0, F_DISC_T + F_LIFT]) { color(C_BODY2) f_head(); color(C_PAD) pad(XF, F_ZB0); }
      if (VIEW == "use") neck_on_fixed(XF, F_MIN + F_LIFT, TILT_F);
    }
  }
}

echo(str("DERIVED CD=", CD, " GW=", GW, " XA=", XA, " YA=", YA, " ZA=", ZA, " BA=", BA, " BB=", BB, " BC=", BC,
         " YC=", YC, " ZC=", ZC, " C_CHORD=", 2 * C_HALF, " XD=", XD, " YD=", YD, " D_ZU=", D_ZU,
         " XE=", XE, " ZE=", ZE, " E_FOOT=", E_FOOT, " F_MIN=", F_MIN, " F_MAX=", F_MAX, " F_DISC_D=", F_DISC_D,
         " XF=", XF, " YF=", YF, " XC_TOP=", XC_TOP, " C_FR=", C_FR, " TR_W=", TR_W, " C2_VOL=", C2_VOL,
         " C3_LOW=", C3_LOW, " C3_ZS=", C3_ZS, " R_END=", R_END, " R_EDGE=", R_EDGE, " C_LEAN=", C_LEAN,
         " C1R_FLAT=", C1R_FLAT, " RIM_Y=", RIM_Y, " TR_IN=", TR_IN, " TR_D=", TR_D));
